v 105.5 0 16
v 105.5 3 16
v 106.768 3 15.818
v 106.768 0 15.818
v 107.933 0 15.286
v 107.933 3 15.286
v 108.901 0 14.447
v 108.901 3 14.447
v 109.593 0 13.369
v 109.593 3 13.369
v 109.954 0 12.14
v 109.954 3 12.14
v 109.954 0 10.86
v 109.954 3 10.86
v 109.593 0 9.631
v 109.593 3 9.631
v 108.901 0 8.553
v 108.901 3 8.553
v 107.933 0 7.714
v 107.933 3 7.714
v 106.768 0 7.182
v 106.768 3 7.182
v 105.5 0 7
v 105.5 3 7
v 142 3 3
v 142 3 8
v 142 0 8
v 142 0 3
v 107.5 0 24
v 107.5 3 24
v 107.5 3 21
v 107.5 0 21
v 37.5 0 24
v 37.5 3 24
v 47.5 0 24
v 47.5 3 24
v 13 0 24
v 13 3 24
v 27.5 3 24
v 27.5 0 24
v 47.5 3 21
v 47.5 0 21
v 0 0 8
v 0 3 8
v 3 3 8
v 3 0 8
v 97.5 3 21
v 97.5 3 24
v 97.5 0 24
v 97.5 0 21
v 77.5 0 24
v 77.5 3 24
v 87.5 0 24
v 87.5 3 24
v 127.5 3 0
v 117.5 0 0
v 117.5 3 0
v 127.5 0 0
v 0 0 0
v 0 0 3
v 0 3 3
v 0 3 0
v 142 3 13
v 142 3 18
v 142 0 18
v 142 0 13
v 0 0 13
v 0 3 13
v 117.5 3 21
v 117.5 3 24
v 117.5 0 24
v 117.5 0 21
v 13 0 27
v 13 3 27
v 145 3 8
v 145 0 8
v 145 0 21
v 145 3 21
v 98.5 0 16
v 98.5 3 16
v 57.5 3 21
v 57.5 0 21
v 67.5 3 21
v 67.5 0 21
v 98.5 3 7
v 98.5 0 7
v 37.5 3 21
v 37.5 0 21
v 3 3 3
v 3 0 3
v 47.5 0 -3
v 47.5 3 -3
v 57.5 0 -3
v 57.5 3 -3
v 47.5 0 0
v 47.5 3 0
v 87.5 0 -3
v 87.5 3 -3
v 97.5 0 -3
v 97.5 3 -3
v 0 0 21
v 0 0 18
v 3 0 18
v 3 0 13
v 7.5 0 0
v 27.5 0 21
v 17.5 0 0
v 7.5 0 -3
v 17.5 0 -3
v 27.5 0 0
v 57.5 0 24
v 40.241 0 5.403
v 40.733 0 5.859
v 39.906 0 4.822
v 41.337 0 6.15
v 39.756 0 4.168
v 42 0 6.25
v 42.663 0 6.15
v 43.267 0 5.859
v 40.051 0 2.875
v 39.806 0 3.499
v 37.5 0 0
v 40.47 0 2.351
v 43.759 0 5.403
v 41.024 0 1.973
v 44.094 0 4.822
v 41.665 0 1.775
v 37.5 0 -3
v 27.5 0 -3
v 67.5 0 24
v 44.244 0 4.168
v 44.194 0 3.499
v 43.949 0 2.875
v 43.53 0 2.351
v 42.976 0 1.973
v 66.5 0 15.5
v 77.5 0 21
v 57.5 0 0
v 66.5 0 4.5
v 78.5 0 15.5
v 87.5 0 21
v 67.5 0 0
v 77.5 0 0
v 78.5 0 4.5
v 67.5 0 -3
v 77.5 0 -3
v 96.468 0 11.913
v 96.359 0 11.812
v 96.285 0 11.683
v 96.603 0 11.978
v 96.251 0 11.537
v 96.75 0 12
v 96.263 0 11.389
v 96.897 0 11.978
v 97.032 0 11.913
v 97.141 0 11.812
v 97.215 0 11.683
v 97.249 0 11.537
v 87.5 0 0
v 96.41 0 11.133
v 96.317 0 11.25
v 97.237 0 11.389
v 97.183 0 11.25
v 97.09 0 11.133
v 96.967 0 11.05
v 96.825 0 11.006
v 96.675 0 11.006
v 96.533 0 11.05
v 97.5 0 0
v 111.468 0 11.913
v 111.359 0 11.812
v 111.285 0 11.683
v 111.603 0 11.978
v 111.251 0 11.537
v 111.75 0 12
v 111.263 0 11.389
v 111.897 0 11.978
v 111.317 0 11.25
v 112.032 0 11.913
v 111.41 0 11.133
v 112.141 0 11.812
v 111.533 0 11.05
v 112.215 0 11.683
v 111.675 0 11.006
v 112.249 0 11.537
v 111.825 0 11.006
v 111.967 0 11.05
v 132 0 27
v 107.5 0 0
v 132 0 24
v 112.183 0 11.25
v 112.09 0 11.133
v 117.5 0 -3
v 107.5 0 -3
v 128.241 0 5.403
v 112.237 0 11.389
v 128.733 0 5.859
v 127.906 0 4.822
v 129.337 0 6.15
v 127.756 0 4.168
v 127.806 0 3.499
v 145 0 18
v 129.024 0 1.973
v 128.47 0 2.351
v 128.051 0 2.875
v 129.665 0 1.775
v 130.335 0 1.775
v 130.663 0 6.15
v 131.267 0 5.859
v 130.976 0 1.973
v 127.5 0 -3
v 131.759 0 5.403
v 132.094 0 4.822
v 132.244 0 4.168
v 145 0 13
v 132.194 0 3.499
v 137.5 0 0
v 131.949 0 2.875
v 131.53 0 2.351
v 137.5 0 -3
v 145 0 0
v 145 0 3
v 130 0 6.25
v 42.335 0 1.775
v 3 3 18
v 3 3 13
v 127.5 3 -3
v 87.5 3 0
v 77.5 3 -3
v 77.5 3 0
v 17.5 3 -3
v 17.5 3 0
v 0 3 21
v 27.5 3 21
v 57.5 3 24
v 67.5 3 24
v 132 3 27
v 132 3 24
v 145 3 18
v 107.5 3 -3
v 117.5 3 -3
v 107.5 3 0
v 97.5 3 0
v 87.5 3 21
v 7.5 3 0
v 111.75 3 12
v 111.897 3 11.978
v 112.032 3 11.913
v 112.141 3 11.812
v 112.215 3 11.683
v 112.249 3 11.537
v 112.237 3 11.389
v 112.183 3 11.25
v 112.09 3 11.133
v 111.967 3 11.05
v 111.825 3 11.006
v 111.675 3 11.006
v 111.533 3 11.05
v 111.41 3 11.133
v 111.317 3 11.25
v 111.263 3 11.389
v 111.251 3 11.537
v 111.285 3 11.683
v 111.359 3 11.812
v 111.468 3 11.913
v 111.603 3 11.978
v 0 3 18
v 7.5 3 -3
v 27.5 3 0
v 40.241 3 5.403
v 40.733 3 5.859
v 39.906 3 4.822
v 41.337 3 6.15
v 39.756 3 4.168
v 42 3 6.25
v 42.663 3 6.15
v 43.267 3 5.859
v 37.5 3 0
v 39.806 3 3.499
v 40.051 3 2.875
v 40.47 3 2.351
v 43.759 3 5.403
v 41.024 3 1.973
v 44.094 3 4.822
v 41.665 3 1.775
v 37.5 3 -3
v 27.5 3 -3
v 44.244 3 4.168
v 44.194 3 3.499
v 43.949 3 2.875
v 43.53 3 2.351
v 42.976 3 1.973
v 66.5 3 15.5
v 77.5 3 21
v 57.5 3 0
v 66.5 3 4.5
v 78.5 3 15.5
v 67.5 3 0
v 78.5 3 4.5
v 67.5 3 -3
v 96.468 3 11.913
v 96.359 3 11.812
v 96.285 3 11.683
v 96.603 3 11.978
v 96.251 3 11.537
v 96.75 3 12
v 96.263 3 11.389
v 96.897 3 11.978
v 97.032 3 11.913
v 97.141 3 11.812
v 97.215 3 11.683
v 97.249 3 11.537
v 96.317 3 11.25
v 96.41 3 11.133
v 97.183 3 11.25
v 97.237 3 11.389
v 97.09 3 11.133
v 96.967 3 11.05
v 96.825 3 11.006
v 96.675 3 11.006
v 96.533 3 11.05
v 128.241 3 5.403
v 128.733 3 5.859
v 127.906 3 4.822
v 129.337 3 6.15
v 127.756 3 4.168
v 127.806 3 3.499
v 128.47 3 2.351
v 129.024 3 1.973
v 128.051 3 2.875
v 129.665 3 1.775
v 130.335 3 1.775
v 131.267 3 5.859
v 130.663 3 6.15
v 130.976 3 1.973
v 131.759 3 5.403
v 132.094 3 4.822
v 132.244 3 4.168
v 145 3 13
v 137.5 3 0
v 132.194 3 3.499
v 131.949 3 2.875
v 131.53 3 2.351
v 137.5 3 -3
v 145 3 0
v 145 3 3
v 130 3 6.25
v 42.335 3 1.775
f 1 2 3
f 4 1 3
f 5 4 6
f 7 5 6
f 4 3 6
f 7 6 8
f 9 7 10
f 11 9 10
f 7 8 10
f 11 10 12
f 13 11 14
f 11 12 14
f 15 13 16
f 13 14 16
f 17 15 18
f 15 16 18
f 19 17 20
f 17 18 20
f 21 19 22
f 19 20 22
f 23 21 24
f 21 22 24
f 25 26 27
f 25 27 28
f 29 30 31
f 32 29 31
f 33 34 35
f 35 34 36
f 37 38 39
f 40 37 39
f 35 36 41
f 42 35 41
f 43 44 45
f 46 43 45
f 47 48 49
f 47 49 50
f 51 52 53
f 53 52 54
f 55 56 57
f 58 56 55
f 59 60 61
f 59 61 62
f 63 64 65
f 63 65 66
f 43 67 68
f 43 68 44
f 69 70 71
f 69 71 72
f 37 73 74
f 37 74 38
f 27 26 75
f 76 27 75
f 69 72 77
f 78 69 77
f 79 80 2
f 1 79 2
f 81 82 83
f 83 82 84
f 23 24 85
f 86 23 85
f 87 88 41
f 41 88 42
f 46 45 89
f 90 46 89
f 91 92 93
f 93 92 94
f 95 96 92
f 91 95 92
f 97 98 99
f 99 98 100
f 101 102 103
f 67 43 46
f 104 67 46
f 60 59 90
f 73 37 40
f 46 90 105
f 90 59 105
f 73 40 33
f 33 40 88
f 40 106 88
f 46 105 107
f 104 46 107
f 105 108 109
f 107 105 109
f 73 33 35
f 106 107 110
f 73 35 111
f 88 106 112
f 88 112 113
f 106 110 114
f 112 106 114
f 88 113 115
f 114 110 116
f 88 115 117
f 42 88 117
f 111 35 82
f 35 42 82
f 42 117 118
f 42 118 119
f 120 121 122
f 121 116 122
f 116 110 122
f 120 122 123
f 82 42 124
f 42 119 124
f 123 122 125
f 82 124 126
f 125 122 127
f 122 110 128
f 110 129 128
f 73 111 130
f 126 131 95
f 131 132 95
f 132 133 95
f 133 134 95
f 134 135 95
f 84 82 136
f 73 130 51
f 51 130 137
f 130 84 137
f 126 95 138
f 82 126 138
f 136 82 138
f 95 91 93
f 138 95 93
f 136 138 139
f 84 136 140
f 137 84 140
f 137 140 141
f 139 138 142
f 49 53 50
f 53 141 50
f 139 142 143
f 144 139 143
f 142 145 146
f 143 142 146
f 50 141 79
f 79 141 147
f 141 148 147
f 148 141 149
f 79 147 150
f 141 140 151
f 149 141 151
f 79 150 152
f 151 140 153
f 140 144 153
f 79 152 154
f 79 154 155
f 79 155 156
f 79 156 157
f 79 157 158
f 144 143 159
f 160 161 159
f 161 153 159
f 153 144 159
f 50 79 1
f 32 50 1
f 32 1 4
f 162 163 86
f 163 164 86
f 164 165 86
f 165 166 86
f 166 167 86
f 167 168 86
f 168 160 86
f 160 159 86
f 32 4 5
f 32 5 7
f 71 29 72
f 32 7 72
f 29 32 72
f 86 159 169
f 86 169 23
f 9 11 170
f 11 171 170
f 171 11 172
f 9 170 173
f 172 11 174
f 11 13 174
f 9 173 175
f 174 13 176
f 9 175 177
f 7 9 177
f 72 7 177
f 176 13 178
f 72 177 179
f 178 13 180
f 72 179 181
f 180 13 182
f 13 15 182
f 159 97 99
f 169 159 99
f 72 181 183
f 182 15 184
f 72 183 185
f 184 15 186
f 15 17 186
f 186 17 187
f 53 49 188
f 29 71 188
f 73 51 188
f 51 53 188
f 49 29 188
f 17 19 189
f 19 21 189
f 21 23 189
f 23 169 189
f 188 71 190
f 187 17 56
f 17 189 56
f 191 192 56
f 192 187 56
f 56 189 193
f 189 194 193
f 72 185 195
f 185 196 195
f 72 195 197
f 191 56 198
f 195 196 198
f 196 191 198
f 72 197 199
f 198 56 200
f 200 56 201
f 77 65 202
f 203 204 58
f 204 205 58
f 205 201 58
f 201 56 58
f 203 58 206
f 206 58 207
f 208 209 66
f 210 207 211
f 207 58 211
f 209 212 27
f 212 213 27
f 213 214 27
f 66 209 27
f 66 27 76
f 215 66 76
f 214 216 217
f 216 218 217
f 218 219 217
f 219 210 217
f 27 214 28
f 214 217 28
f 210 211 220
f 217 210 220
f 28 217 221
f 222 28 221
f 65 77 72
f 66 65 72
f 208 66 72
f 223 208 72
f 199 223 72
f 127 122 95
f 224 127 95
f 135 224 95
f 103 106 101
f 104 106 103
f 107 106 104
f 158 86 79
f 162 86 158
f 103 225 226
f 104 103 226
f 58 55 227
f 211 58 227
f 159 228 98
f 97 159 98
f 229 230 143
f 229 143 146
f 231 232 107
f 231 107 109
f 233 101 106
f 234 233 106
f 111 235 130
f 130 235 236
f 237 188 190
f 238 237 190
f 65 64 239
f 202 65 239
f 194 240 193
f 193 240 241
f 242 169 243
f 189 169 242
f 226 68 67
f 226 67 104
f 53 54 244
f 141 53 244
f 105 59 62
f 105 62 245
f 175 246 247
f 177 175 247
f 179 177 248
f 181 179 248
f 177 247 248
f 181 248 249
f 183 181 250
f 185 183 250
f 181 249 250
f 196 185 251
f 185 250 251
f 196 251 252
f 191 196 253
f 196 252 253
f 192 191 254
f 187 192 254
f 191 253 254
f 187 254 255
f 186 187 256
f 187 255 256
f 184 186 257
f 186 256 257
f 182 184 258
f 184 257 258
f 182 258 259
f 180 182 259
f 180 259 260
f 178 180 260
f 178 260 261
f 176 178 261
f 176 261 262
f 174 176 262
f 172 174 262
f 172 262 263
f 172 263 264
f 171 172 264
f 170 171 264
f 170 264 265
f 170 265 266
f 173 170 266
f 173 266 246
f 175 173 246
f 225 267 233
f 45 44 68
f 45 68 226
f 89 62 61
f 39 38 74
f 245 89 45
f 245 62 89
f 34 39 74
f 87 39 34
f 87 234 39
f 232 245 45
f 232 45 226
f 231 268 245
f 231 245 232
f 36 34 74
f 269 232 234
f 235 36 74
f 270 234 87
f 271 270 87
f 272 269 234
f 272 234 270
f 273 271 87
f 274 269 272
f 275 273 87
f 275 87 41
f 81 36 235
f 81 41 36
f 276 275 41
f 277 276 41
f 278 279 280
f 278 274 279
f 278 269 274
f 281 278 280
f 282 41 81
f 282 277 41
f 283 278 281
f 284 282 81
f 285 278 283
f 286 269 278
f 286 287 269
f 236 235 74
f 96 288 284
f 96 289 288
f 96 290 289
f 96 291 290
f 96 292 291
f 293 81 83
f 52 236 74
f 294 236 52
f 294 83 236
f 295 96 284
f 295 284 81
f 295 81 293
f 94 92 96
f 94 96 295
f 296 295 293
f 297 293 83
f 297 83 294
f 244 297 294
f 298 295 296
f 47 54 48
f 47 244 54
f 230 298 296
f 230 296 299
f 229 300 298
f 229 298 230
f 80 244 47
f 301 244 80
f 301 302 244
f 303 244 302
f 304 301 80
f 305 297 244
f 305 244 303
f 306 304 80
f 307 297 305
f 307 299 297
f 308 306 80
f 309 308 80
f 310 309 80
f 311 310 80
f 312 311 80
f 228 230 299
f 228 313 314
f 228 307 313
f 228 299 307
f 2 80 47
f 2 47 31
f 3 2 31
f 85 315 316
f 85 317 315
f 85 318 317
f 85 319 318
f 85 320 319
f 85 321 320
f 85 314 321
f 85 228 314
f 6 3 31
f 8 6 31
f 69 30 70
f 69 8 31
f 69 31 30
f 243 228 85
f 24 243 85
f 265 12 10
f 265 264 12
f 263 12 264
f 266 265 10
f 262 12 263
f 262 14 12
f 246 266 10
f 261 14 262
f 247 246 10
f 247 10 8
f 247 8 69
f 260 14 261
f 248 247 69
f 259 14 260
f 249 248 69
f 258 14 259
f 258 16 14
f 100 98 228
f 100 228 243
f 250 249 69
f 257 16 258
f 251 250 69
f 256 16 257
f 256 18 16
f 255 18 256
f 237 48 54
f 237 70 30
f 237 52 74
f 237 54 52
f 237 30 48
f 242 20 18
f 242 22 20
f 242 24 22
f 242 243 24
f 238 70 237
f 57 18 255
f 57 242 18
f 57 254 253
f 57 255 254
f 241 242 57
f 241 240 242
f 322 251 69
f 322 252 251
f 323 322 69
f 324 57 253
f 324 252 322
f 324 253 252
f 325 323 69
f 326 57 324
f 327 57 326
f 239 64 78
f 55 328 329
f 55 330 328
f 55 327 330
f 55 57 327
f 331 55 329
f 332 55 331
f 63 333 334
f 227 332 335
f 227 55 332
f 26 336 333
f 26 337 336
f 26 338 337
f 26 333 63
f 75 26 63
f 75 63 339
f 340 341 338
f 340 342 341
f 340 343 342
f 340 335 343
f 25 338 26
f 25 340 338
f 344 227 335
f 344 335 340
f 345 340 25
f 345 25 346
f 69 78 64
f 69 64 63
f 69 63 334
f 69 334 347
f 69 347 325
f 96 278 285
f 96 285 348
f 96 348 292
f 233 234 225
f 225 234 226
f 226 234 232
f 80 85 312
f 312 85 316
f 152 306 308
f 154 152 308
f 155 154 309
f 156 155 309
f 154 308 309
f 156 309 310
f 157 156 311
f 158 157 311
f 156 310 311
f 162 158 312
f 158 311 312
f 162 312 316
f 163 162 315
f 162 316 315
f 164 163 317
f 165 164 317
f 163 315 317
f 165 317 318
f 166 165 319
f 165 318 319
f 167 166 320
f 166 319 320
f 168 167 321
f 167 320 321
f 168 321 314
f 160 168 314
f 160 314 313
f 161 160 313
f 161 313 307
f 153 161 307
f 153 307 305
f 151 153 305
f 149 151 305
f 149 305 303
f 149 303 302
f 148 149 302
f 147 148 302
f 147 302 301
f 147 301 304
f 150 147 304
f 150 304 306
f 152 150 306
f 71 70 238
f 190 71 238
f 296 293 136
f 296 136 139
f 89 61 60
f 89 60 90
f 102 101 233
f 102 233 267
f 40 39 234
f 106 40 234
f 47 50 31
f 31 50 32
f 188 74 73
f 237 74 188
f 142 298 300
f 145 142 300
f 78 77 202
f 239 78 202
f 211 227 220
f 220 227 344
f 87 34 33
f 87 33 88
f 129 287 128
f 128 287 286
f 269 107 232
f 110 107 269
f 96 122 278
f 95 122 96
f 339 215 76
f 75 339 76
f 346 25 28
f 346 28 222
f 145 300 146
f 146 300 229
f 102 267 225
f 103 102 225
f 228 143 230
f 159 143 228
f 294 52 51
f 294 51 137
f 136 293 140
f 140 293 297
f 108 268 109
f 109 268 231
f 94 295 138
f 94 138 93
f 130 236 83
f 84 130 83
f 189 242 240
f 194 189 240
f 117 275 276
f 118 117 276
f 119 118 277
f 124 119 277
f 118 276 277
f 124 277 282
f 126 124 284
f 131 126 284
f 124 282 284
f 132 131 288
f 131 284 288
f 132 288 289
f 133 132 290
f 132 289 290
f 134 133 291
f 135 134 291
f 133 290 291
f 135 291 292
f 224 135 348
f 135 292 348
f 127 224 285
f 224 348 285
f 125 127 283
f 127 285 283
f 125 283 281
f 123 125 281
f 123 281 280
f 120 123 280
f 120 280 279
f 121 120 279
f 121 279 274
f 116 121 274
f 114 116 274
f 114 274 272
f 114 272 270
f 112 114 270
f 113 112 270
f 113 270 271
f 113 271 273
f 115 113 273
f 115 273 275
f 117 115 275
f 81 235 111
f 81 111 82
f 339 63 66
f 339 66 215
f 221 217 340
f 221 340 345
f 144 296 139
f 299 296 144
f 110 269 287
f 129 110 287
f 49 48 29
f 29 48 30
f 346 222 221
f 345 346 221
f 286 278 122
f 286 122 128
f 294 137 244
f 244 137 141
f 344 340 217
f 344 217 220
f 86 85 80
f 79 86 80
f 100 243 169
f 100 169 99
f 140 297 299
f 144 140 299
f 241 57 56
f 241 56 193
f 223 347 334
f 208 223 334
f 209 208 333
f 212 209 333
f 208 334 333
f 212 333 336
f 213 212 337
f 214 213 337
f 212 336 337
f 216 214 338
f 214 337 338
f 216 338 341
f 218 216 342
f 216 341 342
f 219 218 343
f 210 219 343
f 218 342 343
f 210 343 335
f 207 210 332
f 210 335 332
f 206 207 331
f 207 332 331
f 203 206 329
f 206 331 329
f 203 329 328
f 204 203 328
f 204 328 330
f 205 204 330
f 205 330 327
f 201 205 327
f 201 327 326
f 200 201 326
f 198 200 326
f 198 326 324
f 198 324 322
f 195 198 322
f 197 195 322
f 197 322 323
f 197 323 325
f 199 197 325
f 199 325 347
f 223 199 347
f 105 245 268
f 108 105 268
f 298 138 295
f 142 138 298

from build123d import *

# Parameters (mm, degrees)
SKETCH1_W           = 145
SKETCH1_H           = 21
BOSS_EXTRUDE1_DEPTH = 3
SKETCH2_W           = 12
SKETCH2_H           = 11
CUT_EXTRUDE1_DEPTH  = 147.543508898
SKETCH3_R           = 2.25
CUT_EXTRUDE2_DEPTH  = 147.543508898
SKETCH4_R           = 0.5
CUT_EXTRUDE3_DEPTH  = 147.543508898
SKETCH5_W           = 10
SKETCH5_H           = 3
BOSS_EXTRUDE2_DEPTH = 3
LPATTERN1_COUNT     = 4
LPATTERN1_PITCH     = 20
LPATTERN1_COL_COUNT = 4
LPATTERN1_COL_PITCH = 20
SKETCH6_W           = 145
SKETCH6_H           = 3
BOSS_EXTRUDE3_DEPTH = 3
SKETCH8_W           = 10
SKETCH8_H           = 3
CUT_EXTRUDE4_DEPTH  = 148.522879581
SKETCH9_W           = 3
SKETCH9_H           = 5
CUT_EXTRUDE5_DEPTH  = 148.522879581
SKETCH10_W          = 13
SKETCH10_H          = 3
CUT_EXTRUDE6_DEPTH  = 148.522879581


with BuildPart() as part:
    # Sketch1 → Boss-Extrude1 (new body)
    with BuildSketch(Plane(origin=(0, 0, 0), x_dir=(1, 0, 0), z_dir=(0, 1, 0))):
        with Locations((72.5, -10.5)):
            Rectangle(SKETCH1_W, SKETCH1_H)
    extrude(amount=BOSS_EXTRUDE1_DEPTH)

    # Sketch2 → Cut-Extrude1 (cut, through all)
    with BuildSketch(Plane(origin=(0, 3, 0), x_dir=(1, 0, 0), z_dir=(0, 1, 0))):
        with Locations((72.5, -10)):
            Rectangle(SKETCH2_W, SKETCH2_H)
    extrude(amount=-CUT_EXTRUDE1_DEPTH, mode=Mode.SUBTRACT)

    # Sketch3 → Cut-Extrude2 (cut, through all)
    with BuildSketch(Plane(origin=(0, 3, 0), x_dir=(1, 0, 0), z_dir=(0, 1, 0))):
        with Locations(Location((42, -4, 0), (0, 0, 270))):
            Circle(SKETCH3_R)
        with Locations(Location((130, -4, 0), (0, 0, 270))):
            Circle(SKETCH3_R)
    extrude(amount=-CUT_EXTRUDE2_DEPTH, mode=Mode.SUBTRACT)

    # Sketch4 → Cut-Extrude3 (cut, through all)
    with BuildSketch(Plane(origin=(0, 3, 0), x_dir=(1, 0, 0), z_dir=(0, 1, 0))):
        with BuildLine():
            Line((98.5, -7), (98.5, -16))
            Line((98.5, -16), (105.5, -16))
            ThreePointArc((105.5, -16), (110, -11.500000006), (105.500000011, -7))
            Line((105.500000011, -7), (98.5, -7))
        make_face()
        with Locations(Location((96.75, -11.5, 0), (0, 0, 270))):
            Circle(SKETCH4_R)
        with Locations(Location((111.75, -11.5, 0), (0, 0, 270))):
            Circle(SKETCH4_R)
    extrude(amount=-CUT_EXTRUDE3_DEPTH, mode=Mode.SUBTRACT)

    # Sketch5 → Boss-Extrude2 (add, through all)
    with BuildSketch(Plane(origin=(0, 3, 0), x_dir=(1, 0, 0), z_dir=(0, 1, 0))):
        with Locations((72.5, -22.5)):
            Rectangle(SKETCH5_W, SKETCH5_H)
        with Locations((72.5, 1.5)):
            Rectangle(SKETCH5_W, SKETCH5_H)
    boss_extrude2 = extrude(amount=-BOSS_EXTRUDE2_DEPTH)

    # LPattern1: Boss-Extrude2 ×4
    with Locations(*[(-i * LPATTERN1_PITCH, 0, 0) for i in range(1, LPATTERN1_COUNT)]):
        add(boss_extrude2)

    # LPattern1 col: Boss-Extrude2 ×4
    with Locations(*[(i * LPATTERN1_COL_PITCH, 0, 0) for i in range(1, LPATTERN1_COL_COUNT)]):
        add(boss_extrude2)

    # Sketch6 → Boss-Extrude3 (add, through all)
    with BuildSketch(Plane(origin=(0, 3, 0), x_dir=(1, 0, 0), z_dir=(0, 1, 0))):
        with Locations((72.5, -25.5)):
            Rectangle(SKETCH6_W, SKETCH6_H)
    extrude(amount=-BOSS_EXTRUDE3_DEPTH)

    # Sketch8 → Cut-Extrude4 (cut, through all)
    with BuildSketch(Plane(origin=(0, 0, 0), x_dir=(-1, 0, 0), z_dir=(0, -1, 0))):
        with Locations((-12.5, -22.5)):
            Rectangle(SKETCH8_W, SKETCH8_H)
        with Locations((-132.5, -22.5)):
            Rectangle(SKETCH8_W, SKETCH8_H)
    extrude(amount=-CUT_EXTRUDE4_DEPTH, mode=Mode.SUBTRACT)

    # Sketch9 → Cut-Extrude5 (cut, through all)
    with BuildSketch(Plane(origin=(0, 3, 0), x_dir=(1, 0, 0), z_dir=(0, 1, 0))):
        with Locations((1.5, -15.5)):
            Rectangle(SKETCH9_W, SKETCH9_H)
        with Locations((1.5, -5.5)):
            Rectangle(SKETCH9_W, SKETCH9_H)
        with Locations((143.5, -15.5)):
            Rectangle(SKETCH9_W, SKETCH9_H)
        with Locations((143.5, -5.5)):
            Rectangle(SKETCH9_W, SKETCH9_H)
    extrude(amount=-CUT_EXTRUDE5_DEPTH, mode=Mode.SUBTRACT)

    # Sketch10 → Cut-Extrude6 (cut, through all)
    with BuildSketch(Plane(origin=(0, 0, 0), x_dir=(-1, 0, 0), z_dir=(0, -1, 0))):
        with Locations((-6.5, -25.5)):
            Rectangle(SKETCH10_W, SKETCH10_H)
        with Locations((-138.5, -25.5)):
            Rectangle(SKETCH10_W, SKETCH10_H)
    extrude(amount=-CUT_EXTRUDE6_DEPTH, mode=Mode.SUBTRACT)


solid = part.part
